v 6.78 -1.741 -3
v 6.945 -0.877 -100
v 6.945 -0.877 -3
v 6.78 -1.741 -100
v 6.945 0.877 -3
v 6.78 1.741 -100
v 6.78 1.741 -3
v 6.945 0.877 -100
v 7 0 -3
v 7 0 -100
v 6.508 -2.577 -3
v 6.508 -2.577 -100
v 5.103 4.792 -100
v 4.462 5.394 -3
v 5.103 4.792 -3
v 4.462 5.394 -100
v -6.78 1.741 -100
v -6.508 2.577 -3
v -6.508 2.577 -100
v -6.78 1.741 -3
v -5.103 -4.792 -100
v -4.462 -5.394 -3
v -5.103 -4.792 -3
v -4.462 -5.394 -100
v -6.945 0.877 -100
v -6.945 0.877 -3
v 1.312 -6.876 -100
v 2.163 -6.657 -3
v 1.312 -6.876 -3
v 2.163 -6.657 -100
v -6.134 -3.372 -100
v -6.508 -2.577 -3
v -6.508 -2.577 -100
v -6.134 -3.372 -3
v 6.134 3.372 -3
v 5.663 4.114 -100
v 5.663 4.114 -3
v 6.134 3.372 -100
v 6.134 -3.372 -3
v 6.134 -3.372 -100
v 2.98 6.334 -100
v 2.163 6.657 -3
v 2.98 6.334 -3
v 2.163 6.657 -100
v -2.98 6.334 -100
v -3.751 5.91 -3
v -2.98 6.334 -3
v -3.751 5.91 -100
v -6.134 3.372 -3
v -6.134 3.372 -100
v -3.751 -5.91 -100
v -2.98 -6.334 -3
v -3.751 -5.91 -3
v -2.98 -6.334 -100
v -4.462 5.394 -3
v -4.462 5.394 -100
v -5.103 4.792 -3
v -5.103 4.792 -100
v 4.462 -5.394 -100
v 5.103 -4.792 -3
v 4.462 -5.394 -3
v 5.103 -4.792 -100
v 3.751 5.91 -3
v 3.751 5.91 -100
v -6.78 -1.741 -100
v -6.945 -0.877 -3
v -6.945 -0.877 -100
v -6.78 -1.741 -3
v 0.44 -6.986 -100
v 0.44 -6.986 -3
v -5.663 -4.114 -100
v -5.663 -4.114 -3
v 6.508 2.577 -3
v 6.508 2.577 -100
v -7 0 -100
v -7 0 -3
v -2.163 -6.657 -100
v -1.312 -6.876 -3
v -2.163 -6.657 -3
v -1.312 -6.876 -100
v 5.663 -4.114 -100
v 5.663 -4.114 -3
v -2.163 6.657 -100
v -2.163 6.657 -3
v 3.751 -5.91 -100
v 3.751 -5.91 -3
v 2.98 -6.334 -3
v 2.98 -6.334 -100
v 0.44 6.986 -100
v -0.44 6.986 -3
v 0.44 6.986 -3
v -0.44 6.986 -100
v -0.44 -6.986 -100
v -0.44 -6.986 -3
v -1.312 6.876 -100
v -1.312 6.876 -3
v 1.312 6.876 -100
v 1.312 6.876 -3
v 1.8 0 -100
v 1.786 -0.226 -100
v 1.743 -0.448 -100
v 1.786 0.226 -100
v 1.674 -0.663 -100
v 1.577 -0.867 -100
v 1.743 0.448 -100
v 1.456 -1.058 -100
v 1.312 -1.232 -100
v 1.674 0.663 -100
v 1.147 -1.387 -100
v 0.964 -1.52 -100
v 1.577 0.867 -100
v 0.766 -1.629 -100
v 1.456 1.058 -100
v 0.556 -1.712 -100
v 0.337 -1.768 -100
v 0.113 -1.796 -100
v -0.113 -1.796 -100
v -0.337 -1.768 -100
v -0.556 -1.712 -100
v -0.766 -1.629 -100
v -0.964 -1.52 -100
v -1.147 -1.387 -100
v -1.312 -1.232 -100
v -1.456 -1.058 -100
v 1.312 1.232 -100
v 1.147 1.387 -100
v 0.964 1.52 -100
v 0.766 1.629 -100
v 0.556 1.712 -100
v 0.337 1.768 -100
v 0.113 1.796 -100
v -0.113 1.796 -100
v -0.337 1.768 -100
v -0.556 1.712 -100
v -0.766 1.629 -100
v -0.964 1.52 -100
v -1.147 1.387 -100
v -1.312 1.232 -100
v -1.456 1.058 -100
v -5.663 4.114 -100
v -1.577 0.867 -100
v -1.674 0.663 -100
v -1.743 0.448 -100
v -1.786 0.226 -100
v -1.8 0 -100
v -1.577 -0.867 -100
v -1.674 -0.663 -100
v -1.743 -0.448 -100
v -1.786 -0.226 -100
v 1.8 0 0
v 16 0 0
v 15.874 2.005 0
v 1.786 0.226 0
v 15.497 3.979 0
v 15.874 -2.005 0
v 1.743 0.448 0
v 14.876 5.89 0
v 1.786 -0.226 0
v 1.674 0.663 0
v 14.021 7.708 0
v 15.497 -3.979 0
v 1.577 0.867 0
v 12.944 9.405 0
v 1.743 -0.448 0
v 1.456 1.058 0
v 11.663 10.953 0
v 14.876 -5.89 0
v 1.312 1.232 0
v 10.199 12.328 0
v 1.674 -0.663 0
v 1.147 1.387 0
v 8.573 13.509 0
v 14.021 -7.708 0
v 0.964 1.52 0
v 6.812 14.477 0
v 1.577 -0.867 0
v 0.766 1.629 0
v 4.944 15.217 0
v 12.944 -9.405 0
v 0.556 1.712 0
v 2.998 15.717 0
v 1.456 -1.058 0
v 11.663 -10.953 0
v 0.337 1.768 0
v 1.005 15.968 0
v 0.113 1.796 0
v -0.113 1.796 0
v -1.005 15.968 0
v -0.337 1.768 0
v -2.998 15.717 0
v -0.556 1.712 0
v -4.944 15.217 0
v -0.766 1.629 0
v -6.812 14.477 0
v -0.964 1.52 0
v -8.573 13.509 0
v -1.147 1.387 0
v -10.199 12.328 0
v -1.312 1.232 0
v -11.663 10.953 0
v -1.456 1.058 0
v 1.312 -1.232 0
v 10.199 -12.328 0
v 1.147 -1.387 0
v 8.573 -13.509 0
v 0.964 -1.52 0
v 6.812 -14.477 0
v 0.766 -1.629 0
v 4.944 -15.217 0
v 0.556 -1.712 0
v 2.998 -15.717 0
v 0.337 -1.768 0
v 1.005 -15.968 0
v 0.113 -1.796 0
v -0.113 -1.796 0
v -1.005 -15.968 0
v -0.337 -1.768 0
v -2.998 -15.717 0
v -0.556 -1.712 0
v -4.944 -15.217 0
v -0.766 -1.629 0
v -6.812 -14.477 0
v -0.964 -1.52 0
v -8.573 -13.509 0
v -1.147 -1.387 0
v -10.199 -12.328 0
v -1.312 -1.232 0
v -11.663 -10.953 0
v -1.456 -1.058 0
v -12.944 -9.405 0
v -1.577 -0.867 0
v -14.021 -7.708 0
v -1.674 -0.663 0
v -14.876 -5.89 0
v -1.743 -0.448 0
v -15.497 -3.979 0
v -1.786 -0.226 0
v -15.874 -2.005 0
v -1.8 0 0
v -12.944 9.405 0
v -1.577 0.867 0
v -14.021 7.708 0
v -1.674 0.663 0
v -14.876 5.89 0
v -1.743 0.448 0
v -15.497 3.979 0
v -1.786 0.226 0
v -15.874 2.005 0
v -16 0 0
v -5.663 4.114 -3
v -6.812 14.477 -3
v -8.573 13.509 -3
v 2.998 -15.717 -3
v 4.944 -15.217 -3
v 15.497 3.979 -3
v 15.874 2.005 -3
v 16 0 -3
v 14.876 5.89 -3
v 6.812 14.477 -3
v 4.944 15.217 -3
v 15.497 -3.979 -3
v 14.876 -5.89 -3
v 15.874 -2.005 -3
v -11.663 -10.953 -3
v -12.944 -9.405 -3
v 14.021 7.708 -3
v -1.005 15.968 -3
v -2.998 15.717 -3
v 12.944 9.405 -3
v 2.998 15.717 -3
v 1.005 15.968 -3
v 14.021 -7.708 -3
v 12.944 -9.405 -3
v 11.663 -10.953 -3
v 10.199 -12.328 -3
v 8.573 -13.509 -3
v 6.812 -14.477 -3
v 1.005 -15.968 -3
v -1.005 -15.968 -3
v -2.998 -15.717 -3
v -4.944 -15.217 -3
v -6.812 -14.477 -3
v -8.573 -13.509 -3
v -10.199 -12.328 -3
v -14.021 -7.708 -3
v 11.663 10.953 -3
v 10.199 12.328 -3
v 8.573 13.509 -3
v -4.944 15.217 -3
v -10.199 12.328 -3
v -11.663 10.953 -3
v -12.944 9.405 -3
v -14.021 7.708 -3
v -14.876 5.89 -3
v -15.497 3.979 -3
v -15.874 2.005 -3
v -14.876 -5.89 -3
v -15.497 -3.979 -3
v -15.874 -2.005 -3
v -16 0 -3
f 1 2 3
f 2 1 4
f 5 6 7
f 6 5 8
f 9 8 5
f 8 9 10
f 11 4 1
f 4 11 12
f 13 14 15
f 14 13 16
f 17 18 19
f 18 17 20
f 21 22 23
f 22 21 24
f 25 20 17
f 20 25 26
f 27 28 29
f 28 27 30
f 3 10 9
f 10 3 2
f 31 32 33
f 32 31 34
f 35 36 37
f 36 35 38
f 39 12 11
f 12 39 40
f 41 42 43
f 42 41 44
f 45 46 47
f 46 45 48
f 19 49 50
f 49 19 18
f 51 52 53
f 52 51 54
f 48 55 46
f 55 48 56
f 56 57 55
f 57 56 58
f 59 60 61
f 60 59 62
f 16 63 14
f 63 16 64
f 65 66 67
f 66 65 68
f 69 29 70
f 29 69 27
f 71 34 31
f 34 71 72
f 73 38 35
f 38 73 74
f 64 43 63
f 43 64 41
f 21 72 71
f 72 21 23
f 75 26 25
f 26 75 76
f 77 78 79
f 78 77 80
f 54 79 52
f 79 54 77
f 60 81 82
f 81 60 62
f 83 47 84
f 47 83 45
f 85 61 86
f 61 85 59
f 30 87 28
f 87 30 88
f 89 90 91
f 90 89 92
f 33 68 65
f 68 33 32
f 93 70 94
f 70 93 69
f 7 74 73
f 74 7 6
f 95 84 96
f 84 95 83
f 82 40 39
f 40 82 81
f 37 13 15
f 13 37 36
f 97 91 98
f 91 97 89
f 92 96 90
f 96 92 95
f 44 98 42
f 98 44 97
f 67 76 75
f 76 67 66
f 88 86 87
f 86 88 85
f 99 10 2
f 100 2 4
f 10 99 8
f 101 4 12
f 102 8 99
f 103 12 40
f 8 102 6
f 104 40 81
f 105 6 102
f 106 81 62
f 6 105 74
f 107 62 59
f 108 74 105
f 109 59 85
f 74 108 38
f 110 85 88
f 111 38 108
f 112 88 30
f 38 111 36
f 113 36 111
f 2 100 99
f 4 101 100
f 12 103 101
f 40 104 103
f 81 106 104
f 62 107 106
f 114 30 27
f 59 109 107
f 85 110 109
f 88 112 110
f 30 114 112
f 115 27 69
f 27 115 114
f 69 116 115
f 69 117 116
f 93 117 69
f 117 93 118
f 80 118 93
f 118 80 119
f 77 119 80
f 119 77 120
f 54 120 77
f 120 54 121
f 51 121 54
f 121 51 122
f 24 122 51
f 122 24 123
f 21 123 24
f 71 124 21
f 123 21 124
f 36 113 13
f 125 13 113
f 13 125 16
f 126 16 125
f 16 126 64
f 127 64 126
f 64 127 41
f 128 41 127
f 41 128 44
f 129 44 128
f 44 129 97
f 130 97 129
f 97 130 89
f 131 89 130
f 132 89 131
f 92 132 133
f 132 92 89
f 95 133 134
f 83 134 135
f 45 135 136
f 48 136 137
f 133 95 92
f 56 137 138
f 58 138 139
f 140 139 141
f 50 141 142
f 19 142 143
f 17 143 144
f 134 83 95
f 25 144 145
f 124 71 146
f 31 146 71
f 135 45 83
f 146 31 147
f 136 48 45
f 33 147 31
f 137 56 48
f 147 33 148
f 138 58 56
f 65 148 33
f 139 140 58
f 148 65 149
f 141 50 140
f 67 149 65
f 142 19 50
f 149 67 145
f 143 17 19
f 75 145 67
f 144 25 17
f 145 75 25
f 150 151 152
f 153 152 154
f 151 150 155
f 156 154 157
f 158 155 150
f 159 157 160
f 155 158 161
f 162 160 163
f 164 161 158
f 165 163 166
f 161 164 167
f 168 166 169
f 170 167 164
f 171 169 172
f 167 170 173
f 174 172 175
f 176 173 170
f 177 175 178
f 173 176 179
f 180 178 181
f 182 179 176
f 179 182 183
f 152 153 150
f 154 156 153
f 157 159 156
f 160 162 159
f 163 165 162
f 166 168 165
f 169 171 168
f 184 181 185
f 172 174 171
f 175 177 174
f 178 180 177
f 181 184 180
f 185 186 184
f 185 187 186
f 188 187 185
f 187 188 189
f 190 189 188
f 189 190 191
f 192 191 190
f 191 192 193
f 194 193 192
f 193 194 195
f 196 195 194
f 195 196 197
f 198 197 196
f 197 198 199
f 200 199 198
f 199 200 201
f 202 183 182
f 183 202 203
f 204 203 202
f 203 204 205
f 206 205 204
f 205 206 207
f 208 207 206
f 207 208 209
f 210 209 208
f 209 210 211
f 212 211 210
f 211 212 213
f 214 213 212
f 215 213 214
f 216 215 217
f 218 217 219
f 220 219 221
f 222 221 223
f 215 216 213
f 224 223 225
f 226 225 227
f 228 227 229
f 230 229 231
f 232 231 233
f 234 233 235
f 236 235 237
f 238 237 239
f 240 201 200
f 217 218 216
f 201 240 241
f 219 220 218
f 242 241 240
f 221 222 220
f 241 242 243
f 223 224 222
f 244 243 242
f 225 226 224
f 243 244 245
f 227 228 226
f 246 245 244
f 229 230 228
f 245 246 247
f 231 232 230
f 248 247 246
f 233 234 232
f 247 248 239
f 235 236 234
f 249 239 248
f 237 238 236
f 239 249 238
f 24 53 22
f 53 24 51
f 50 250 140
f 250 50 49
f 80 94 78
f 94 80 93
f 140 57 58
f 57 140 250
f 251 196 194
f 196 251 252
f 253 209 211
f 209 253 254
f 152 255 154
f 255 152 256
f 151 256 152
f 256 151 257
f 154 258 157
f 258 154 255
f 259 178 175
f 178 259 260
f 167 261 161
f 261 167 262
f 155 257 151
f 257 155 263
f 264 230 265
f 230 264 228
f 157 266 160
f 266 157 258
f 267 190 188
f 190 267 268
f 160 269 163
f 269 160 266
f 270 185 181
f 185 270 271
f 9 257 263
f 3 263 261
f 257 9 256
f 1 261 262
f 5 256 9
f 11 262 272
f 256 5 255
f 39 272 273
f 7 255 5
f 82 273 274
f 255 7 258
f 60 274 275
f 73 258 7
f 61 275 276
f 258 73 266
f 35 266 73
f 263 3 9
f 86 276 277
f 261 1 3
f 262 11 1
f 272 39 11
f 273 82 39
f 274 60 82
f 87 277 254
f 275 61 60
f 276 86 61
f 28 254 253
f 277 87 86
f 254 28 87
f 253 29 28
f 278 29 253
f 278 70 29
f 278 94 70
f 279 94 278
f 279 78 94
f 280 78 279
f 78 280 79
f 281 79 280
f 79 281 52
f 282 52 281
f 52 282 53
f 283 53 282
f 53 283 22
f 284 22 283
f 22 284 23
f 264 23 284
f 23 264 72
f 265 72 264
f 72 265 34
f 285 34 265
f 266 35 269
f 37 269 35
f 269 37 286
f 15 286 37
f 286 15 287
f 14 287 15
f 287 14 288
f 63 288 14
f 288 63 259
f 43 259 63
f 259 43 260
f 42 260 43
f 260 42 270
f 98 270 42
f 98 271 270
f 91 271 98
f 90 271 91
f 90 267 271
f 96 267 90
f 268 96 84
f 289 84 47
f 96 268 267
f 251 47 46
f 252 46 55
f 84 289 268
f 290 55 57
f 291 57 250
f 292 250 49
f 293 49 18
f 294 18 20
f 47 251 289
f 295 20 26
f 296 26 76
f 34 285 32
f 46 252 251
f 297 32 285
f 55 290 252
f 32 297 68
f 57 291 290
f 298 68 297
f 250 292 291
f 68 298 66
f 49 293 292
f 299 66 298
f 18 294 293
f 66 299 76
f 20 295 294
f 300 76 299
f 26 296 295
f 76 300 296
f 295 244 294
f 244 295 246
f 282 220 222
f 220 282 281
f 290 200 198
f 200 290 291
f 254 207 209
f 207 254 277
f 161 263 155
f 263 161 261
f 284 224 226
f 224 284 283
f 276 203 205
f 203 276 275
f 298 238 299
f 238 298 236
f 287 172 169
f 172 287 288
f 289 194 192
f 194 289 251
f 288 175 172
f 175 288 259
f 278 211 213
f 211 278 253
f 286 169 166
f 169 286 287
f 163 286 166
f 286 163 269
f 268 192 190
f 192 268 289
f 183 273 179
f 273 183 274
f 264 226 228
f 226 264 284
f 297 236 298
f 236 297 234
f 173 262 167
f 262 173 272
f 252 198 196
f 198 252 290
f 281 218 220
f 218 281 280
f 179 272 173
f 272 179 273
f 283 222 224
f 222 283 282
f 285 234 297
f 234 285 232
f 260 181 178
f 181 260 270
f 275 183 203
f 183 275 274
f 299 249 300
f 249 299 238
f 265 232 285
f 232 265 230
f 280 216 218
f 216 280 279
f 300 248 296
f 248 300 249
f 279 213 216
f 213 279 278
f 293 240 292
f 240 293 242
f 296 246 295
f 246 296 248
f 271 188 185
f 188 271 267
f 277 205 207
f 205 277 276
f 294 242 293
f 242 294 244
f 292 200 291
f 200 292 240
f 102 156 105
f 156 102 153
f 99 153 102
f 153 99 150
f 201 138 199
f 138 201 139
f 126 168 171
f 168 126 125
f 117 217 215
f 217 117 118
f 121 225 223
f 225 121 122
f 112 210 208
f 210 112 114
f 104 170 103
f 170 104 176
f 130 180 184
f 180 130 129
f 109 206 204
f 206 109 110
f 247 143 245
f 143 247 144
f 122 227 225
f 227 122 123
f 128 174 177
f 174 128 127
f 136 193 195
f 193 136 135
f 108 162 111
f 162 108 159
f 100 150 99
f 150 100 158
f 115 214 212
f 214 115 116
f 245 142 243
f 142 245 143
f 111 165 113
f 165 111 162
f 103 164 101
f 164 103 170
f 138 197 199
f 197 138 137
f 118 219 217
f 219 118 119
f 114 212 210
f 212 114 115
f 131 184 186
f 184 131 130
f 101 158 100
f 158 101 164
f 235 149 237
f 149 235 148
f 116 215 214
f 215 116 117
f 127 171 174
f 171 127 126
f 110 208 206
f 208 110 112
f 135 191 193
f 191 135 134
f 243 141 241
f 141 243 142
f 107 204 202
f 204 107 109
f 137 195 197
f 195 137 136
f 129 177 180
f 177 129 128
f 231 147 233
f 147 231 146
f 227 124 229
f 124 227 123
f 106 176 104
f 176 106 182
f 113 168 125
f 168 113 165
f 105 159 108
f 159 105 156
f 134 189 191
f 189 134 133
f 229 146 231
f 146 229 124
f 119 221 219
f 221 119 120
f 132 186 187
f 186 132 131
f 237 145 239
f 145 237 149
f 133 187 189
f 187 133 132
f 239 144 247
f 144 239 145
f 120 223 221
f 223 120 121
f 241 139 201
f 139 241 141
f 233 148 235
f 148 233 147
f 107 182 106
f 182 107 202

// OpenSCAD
$fn = 50;


difference() {
	union() {
		translate(v = [0, 0, -100.0000000000]) {
			cylinder(h = 100, r = 7.0000000000);
		}
		translate(v = [0, 0, -3.0000000000]) {
			cylinder(h = 3, r = 16.0000000000);
		}
	}
	union() {
		#translate(v = [0, 0, -100]) {
			cylinder(h = 100, r = 1.8000000000);
		}
	}
}
